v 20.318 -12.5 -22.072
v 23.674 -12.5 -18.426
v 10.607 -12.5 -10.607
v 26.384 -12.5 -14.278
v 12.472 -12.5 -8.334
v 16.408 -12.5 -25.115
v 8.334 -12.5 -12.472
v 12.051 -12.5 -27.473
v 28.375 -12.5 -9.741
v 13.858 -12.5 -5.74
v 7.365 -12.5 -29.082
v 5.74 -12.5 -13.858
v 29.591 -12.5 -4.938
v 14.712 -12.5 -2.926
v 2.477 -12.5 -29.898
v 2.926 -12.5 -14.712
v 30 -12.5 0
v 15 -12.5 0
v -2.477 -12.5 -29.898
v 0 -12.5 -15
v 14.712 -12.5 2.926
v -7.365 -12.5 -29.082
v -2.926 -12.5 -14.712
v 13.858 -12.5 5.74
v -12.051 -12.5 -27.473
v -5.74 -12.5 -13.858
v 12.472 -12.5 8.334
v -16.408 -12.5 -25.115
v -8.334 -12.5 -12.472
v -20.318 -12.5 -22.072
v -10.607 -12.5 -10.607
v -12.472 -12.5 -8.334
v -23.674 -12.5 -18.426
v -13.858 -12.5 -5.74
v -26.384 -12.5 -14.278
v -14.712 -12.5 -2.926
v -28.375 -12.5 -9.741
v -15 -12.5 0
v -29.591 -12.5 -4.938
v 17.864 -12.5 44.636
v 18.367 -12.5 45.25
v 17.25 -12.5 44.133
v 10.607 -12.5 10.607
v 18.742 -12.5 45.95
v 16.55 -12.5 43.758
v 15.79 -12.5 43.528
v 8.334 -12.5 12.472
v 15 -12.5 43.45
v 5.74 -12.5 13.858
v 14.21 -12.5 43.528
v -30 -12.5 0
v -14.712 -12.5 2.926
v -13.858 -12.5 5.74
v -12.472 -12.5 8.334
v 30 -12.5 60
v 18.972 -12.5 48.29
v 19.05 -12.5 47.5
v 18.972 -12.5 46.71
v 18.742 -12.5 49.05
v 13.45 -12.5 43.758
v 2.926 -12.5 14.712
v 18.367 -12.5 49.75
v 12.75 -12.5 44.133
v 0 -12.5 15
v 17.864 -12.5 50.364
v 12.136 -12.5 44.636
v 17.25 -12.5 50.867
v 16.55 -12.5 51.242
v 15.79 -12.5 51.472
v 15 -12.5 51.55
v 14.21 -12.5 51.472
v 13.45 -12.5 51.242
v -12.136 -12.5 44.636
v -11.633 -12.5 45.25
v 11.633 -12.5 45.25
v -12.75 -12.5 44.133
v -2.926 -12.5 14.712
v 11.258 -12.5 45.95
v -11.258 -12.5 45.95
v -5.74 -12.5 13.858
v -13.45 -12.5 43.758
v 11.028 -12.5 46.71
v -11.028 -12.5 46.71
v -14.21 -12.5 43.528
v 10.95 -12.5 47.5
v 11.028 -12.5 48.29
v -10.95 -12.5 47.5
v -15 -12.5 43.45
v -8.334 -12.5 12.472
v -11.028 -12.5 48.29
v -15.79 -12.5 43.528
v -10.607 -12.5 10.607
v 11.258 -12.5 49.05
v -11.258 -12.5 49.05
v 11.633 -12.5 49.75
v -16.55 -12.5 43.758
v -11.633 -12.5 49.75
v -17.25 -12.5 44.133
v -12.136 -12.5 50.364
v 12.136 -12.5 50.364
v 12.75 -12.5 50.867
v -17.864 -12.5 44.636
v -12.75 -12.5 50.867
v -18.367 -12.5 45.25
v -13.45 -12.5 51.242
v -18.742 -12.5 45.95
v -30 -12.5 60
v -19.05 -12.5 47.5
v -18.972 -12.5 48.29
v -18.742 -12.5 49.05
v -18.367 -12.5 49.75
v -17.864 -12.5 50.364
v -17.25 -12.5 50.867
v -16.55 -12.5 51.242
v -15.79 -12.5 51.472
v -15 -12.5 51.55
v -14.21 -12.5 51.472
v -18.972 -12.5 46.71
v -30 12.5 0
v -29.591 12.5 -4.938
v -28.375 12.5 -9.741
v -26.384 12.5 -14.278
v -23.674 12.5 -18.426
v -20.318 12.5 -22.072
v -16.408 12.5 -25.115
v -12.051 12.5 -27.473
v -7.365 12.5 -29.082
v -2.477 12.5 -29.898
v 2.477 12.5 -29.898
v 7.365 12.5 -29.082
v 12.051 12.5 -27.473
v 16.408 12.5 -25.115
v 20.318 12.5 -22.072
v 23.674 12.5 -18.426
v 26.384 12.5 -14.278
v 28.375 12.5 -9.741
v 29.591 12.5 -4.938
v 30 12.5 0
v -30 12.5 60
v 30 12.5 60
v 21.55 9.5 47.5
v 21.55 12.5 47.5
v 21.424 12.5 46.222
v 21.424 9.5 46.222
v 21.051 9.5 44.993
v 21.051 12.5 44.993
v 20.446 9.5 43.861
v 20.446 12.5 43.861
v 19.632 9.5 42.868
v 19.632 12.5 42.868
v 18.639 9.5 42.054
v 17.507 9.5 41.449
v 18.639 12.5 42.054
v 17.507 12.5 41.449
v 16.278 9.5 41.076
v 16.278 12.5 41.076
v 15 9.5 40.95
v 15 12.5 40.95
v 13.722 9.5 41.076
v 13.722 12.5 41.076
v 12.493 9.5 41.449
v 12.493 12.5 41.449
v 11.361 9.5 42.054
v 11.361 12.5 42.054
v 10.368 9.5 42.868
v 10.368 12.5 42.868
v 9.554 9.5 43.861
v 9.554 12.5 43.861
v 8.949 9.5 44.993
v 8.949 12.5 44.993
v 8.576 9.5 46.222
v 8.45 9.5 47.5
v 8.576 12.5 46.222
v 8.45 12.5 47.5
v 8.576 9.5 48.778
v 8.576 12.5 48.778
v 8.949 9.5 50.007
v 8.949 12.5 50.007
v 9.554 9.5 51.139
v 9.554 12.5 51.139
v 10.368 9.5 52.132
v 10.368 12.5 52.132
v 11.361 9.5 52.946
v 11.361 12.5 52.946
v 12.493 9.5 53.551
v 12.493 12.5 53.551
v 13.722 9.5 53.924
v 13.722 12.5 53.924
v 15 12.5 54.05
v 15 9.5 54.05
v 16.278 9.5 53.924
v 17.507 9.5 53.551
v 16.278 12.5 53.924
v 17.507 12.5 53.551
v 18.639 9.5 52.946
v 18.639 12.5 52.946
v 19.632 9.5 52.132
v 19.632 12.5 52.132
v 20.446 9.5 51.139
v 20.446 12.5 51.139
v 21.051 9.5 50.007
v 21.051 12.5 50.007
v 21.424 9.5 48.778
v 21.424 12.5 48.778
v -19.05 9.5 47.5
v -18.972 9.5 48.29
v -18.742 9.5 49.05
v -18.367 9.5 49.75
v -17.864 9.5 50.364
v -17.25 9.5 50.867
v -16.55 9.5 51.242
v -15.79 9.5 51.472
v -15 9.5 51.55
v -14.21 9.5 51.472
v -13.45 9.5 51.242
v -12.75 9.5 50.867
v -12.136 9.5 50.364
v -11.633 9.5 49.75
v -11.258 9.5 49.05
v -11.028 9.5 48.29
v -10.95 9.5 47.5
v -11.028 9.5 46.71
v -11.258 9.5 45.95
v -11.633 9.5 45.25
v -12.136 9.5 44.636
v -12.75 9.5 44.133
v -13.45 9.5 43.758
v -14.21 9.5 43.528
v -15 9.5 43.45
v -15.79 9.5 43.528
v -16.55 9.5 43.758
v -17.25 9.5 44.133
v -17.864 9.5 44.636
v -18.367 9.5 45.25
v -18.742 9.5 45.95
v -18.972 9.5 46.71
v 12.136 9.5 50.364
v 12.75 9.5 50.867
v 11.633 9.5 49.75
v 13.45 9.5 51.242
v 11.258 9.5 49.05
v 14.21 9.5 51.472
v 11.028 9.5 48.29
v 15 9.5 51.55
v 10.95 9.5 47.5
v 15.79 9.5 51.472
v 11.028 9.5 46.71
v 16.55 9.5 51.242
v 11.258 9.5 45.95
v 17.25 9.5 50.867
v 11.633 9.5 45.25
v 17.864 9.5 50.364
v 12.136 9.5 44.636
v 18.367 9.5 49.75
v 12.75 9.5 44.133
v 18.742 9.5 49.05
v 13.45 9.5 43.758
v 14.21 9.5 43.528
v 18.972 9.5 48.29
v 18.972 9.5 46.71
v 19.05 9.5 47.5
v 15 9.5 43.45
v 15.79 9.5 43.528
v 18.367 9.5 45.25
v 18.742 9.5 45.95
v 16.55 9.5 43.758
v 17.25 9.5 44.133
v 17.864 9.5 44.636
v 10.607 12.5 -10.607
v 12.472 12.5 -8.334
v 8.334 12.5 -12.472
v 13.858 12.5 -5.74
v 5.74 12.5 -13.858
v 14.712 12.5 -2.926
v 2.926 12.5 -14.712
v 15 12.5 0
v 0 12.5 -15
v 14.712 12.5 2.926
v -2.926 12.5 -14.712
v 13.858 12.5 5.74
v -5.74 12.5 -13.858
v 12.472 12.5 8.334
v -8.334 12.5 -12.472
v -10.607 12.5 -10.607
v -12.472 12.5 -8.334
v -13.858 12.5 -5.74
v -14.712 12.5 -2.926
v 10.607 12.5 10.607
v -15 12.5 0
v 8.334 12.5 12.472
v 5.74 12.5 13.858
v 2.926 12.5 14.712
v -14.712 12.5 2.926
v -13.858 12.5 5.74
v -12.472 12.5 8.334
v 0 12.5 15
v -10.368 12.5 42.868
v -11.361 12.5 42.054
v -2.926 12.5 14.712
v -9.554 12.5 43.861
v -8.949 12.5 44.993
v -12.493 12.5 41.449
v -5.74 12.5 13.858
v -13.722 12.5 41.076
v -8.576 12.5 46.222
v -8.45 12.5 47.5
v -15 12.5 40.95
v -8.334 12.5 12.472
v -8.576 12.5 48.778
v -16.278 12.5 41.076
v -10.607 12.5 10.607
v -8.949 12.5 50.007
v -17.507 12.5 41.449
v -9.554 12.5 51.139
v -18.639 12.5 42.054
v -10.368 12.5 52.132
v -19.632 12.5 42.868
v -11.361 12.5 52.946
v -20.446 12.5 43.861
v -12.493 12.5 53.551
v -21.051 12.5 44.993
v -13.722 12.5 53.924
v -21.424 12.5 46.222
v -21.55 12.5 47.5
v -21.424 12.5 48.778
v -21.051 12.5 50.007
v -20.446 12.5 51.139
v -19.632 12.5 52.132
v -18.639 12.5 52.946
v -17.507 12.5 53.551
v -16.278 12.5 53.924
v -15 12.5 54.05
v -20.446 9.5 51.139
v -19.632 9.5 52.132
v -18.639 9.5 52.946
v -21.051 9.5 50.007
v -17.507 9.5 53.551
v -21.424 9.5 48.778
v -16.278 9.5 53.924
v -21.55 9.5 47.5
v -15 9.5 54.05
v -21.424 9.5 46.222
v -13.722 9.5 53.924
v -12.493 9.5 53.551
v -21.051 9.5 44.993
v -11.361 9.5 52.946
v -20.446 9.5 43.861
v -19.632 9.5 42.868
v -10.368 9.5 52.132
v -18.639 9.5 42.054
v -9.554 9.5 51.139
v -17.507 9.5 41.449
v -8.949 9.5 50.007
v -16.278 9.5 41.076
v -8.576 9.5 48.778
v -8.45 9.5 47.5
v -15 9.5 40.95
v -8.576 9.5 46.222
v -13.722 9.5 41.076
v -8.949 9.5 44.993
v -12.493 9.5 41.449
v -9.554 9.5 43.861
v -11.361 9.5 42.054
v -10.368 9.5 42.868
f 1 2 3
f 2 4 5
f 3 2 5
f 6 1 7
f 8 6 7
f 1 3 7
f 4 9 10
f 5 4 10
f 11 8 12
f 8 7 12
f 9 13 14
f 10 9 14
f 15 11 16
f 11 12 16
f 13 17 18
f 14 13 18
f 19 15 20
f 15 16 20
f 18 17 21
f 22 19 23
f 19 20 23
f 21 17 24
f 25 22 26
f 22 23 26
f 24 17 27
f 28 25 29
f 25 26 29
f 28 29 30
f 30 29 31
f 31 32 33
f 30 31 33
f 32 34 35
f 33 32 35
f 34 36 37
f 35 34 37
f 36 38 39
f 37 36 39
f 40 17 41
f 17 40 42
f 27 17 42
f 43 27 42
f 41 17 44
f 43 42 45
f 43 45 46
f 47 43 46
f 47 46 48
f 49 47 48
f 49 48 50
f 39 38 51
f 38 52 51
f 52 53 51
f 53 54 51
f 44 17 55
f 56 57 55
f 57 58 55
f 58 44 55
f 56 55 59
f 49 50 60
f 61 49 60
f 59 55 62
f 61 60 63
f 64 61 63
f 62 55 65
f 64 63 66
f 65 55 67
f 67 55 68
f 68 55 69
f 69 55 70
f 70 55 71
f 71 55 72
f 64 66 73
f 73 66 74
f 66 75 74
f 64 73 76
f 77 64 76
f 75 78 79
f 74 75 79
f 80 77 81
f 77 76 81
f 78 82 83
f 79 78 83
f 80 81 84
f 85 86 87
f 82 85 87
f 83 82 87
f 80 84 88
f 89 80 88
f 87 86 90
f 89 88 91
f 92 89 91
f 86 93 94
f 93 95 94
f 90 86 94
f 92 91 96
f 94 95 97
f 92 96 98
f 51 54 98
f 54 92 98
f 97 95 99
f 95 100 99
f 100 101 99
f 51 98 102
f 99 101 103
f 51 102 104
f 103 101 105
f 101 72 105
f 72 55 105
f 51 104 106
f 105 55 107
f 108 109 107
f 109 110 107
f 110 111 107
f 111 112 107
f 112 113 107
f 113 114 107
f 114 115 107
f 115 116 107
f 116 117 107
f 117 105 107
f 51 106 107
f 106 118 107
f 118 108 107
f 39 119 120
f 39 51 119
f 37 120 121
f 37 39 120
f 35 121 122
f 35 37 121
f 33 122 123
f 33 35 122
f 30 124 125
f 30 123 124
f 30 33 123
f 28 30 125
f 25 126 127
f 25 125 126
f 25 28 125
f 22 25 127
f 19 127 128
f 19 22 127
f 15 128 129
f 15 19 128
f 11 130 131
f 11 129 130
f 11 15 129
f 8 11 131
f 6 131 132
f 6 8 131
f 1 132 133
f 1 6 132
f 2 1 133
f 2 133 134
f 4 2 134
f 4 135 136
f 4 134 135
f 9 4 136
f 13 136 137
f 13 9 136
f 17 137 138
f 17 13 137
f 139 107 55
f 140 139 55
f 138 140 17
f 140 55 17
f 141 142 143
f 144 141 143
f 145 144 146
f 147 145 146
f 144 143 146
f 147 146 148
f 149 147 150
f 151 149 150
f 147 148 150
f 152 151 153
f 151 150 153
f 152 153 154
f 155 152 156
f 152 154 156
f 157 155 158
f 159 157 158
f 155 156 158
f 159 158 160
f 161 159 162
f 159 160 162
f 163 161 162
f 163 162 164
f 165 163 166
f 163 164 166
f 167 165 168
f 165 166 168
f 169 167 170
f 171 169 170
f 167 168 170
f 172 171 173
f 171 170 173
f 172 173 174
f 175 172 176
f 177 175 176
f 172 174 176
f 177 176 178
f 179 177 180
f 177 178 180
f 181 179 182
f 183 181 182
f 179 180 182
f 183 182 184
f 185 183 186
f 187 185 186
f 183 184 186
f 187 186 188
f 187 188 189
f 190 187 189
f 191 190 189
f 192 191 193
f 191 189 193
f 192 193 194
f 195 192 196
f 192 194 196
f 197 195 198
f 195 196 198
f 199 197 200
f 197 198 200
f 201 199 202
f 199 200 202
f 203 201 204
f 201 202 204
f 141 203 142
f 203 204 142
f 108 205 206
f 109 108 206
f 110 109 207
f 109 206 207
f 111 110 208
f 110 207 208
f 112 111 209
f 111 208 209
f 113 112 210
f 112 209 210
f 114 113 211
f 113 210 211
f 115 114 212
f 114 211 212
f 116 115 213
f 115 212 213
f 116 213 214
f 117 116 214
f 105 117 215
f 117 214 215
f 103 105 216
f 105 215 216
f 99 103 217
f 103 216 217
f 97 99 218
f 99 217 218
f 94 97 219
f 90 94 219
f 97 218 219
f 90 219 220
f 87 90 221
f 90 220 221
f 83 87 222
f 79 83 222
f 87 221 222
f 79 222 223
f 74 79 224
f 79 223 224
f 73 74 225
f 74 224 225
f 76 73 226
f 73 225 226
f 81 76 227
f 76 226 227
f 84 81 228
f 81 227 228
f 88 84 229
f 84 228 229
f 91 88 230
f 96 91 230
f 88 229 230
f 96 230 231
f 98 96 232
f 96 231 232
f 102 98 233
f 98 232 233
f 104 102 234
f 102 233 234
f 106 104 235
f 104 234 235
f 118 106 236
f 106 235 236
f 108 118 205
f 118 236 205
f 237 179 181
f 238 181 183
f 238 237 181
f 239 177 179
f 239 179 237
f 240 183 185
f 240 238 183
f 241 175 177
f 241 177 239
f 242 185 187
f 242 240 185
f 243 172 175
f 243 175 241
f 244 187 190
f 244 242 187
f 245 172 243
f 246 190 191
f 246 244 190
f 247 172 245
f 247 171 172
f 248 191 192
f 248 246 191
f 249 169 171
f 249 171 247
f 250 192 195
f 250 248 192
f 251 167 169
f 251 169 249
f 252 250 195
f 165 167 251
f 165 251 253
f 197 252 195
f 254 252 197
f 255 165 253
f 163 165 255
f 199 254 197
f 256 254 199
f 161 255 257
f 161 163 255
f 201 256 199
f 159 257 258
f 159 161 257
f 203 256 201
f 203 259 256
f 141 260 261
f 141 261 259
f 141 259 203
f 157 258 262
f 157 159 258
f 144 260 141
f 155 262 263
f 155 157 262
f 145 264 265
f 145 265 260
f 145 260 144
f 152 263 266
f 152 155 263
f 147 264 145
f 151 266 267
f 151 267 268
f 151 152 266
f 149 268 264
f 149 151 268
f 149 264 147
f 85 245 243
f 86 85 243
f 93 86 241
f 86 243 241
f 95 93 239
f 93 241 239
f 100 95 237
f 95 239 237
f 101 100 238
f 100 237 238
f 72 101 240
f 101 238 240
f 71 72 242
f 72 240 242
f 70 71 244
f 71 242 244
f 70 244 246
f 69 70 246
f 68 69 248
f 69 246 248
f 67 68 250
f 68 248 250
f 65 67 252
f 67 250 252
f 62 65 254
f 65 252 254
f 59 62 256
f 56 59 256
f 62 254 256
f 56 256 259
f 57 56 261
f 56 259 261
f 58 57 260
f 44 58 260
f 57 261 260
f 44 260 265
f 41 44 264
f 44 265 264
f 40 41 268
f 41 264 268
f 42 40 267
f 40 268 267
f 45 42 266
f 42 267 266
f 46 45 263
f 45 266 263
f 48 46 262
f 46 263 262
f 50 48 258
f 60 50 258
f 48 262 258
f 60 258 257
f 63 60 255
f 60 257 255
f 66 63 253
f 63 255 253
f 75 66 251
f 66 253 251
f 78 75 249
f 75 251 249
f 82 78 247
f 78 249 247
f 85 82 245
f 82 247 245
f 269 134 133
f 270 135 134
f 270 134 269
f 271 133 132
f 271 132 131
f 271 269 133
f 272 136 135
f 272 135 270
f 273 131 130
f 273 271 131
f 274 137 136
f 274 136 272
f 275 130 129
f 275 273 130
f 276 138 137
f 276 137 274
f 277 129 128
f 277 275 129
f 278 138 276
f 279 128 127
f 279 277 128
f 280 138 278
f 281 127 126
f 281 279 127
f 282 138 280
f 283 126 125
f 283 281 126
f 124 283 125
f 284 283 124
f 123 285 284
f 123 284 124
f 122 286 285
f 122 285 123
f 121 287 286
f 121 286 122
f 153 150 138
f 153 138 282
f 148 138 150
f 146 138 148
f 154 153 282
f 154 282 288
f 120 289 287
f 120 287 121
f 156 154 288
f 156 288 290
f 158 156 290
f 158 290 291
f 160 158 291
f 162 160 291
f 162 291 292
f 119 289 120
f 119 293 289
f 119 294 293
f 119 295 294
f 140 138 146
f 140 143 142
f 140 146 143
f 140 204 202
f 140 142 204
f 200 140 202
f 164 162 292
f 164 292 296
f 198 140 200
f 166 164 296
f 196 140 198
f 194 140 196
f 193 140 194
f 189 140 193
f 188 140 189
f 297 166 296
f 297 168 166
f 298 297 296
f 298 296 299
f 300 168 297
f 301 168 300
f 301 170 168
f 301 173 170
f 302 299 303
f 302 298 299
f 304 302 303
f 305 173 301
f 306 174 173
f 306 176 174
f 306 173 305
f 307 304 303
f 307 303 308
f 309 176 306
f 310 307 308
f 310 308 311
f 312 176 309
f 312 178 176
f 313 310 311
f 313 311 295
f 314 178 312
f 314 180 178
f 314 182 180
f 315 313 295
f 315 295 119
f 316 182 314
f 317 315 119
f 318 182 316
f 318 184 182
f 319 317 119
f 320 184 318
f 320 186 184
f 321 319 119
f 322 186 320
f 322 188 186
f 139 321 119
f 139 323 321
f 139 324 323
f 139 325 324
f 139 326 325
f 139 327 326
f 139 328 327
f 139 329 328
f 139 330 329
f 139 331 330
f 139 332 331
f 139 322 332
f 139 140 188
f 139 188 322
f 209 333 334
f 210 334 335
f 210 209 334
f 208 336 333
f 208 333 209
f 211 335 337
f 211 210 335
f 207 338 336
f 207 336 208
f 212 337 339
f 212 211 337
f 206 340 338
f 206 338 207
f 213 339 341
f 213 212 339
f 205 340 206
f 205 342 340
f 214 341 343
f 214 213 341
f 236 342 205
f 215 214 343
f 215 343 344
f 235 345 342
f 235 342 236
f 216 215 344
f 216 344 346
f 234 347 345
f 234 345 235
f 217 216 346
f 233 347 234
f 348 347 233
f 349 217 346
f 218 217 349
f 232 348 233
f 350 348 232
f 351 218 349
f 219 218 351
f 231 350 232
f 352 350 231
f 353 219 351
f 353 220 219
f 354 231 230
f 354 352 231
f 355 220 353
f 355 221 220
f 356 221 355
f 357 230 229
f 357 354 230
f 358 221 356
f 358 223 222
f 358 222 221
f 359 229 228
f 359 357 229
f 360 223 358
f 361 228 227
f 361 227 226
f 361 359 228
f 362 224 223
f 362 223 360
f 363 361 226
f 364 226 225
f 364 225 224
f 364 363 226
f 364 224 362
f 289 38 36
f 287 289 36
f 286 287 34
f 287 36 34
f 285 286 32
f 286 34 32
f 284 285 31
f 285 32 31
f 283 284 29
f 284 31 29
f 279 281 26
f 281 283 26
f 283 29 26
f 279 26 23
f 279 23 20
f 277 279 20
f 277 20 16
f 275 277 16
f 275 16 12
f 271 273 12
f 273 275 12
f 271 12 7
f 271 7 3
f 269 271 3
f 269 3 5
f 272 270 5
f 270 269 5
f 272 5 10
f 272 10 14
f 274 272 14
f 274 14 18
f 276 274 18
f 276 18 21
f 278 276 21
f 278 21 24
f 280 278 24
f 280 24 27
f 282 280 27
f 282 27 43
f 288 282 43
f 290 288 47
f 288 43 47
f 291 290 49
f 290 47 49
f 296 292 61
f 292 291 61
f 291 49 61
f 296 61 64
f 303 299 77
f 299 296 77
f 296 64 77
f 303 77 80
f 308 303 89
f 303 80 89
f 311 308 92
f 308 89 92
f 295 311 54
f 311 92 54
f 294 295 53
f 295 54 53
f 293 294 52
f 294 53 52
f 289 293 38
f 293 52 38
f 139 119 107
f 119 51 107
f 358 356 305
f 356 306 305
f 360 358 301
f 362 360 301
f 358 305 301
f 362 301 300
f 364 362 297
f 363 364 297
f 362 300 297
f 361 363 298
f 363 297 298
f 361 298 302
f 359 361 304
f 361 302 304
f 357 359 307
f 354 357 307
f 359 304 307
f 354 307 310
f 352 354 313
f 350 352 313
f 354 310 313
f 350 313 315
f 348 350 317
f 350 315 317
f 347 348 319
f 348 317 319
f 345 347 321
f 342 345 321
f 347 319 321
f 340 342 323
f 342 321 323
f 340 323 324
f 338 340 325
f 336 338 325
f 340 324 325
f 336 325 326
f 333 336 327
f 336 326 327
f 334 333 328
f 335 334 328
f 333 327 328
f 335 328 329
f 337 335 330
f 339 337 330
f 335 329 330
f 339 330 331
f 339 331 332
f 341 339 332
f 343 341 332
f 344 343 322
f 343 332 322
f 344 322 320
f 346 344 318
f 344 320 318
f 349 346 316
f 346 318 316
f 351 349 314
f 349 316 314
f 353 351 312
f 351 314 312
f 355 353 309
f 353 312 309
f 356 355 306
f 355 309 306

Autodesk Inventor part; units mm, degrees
ref_plane "YZ Plane" through (0, 0, 0) normal (1, 0, 0) x (0, 1, 0)
ref_plane "XZ Plane" through (0, 0, 0) normal (0, 1, 0) x (-1, 0, 0)
ref_plane "XY Plane" through (0, 0, 0) normal (0, 0, 1) x (1, 0, 0)
sketch "Sketch1" plane through (0, 0, 0) normal (0, 1, 0) x (-1, 0, 0)
  line L0 (30, 60) -> (-30, 60)
  line L1 (-30, 60) -> (-30, 0)
  arc A0 (-30, 0) -> (30, 0) centre (0, 0) ccw
  line L2 (30, 0) -> (30, 60)
  circle A1 centre (0, 0) radius 15
  dimension "d0" = 60
  dimension "d1" = 60
  dimension "d2" = 30
extrude "Extrusion1" add sketch "Sketch1" along normal mid plane 25
sketch "Sketch2" plane through (0, 0, 0) normal (0, 1, 0) x (-1, 0, 0)
  line L0 (-30, 0) -> (-30, 60) construction
  line L1 (-30, 60) -> (30, 60) construction
  line L2 (30, 60) -> (30, 0) construction
  arc A0 (-30, 0) -> (30, 0) centre (0, 0) ccw construction
  circle A1 centre (0, 0) radius 15 construction
  line L3 (30, 60) -> (30, 0) construction
  line L4 (30, 35) -> (-30, 35) construction
  circle A2 centre (15, 47.5) radius 4.05
  line L5 (0, 35) -> (0, 60) construction
  circle A3 centre (-15, 47.5) radius 4.05
  point P0 (0, -30)
  point P1 (0, 47.5)
  dimension "d5" = 65
  dimension "d6" = 8.1
  dimension "d7" = 30
extrude "Extrusion2" cut sketch "Sketch2" along normal through all both and the other way through all
sketch "Sketch3" plane through (0, 12.5, 0) normal (0, 1, 0) x (1, 0, 0)
  circle A0 centre (-15, -47.5) radius 4.05 construction
  circle A1 centre (15, -47.5) radius 4.05 construction
  line L0 (30, -60) -> (30, 0) construction
  arc A2 (30, 0) -> (-30, 0) centre (0, 0) ccw construction
  line L1 (-30, 0) -> (-30, -60) construction
  line L2 (-30, -60) -> (30, -60) construction
  circle A3 centre (0, 0) radius 15 construction
  circle A4 centre (-15, -47.5) radius 4.05 projected
  circle A5 centre (-15, -47.5) radius 6.55
  circle A6 centre (15, -47.5) radius 6.55
  dimension "d10" = 13.1
  dimension "d11" = 13.1
extrude "Extrusion3" cut sketch "Sketch3" against normal blind 3 contours A4 | A5 | A6
properties part number "element3_obj4"
